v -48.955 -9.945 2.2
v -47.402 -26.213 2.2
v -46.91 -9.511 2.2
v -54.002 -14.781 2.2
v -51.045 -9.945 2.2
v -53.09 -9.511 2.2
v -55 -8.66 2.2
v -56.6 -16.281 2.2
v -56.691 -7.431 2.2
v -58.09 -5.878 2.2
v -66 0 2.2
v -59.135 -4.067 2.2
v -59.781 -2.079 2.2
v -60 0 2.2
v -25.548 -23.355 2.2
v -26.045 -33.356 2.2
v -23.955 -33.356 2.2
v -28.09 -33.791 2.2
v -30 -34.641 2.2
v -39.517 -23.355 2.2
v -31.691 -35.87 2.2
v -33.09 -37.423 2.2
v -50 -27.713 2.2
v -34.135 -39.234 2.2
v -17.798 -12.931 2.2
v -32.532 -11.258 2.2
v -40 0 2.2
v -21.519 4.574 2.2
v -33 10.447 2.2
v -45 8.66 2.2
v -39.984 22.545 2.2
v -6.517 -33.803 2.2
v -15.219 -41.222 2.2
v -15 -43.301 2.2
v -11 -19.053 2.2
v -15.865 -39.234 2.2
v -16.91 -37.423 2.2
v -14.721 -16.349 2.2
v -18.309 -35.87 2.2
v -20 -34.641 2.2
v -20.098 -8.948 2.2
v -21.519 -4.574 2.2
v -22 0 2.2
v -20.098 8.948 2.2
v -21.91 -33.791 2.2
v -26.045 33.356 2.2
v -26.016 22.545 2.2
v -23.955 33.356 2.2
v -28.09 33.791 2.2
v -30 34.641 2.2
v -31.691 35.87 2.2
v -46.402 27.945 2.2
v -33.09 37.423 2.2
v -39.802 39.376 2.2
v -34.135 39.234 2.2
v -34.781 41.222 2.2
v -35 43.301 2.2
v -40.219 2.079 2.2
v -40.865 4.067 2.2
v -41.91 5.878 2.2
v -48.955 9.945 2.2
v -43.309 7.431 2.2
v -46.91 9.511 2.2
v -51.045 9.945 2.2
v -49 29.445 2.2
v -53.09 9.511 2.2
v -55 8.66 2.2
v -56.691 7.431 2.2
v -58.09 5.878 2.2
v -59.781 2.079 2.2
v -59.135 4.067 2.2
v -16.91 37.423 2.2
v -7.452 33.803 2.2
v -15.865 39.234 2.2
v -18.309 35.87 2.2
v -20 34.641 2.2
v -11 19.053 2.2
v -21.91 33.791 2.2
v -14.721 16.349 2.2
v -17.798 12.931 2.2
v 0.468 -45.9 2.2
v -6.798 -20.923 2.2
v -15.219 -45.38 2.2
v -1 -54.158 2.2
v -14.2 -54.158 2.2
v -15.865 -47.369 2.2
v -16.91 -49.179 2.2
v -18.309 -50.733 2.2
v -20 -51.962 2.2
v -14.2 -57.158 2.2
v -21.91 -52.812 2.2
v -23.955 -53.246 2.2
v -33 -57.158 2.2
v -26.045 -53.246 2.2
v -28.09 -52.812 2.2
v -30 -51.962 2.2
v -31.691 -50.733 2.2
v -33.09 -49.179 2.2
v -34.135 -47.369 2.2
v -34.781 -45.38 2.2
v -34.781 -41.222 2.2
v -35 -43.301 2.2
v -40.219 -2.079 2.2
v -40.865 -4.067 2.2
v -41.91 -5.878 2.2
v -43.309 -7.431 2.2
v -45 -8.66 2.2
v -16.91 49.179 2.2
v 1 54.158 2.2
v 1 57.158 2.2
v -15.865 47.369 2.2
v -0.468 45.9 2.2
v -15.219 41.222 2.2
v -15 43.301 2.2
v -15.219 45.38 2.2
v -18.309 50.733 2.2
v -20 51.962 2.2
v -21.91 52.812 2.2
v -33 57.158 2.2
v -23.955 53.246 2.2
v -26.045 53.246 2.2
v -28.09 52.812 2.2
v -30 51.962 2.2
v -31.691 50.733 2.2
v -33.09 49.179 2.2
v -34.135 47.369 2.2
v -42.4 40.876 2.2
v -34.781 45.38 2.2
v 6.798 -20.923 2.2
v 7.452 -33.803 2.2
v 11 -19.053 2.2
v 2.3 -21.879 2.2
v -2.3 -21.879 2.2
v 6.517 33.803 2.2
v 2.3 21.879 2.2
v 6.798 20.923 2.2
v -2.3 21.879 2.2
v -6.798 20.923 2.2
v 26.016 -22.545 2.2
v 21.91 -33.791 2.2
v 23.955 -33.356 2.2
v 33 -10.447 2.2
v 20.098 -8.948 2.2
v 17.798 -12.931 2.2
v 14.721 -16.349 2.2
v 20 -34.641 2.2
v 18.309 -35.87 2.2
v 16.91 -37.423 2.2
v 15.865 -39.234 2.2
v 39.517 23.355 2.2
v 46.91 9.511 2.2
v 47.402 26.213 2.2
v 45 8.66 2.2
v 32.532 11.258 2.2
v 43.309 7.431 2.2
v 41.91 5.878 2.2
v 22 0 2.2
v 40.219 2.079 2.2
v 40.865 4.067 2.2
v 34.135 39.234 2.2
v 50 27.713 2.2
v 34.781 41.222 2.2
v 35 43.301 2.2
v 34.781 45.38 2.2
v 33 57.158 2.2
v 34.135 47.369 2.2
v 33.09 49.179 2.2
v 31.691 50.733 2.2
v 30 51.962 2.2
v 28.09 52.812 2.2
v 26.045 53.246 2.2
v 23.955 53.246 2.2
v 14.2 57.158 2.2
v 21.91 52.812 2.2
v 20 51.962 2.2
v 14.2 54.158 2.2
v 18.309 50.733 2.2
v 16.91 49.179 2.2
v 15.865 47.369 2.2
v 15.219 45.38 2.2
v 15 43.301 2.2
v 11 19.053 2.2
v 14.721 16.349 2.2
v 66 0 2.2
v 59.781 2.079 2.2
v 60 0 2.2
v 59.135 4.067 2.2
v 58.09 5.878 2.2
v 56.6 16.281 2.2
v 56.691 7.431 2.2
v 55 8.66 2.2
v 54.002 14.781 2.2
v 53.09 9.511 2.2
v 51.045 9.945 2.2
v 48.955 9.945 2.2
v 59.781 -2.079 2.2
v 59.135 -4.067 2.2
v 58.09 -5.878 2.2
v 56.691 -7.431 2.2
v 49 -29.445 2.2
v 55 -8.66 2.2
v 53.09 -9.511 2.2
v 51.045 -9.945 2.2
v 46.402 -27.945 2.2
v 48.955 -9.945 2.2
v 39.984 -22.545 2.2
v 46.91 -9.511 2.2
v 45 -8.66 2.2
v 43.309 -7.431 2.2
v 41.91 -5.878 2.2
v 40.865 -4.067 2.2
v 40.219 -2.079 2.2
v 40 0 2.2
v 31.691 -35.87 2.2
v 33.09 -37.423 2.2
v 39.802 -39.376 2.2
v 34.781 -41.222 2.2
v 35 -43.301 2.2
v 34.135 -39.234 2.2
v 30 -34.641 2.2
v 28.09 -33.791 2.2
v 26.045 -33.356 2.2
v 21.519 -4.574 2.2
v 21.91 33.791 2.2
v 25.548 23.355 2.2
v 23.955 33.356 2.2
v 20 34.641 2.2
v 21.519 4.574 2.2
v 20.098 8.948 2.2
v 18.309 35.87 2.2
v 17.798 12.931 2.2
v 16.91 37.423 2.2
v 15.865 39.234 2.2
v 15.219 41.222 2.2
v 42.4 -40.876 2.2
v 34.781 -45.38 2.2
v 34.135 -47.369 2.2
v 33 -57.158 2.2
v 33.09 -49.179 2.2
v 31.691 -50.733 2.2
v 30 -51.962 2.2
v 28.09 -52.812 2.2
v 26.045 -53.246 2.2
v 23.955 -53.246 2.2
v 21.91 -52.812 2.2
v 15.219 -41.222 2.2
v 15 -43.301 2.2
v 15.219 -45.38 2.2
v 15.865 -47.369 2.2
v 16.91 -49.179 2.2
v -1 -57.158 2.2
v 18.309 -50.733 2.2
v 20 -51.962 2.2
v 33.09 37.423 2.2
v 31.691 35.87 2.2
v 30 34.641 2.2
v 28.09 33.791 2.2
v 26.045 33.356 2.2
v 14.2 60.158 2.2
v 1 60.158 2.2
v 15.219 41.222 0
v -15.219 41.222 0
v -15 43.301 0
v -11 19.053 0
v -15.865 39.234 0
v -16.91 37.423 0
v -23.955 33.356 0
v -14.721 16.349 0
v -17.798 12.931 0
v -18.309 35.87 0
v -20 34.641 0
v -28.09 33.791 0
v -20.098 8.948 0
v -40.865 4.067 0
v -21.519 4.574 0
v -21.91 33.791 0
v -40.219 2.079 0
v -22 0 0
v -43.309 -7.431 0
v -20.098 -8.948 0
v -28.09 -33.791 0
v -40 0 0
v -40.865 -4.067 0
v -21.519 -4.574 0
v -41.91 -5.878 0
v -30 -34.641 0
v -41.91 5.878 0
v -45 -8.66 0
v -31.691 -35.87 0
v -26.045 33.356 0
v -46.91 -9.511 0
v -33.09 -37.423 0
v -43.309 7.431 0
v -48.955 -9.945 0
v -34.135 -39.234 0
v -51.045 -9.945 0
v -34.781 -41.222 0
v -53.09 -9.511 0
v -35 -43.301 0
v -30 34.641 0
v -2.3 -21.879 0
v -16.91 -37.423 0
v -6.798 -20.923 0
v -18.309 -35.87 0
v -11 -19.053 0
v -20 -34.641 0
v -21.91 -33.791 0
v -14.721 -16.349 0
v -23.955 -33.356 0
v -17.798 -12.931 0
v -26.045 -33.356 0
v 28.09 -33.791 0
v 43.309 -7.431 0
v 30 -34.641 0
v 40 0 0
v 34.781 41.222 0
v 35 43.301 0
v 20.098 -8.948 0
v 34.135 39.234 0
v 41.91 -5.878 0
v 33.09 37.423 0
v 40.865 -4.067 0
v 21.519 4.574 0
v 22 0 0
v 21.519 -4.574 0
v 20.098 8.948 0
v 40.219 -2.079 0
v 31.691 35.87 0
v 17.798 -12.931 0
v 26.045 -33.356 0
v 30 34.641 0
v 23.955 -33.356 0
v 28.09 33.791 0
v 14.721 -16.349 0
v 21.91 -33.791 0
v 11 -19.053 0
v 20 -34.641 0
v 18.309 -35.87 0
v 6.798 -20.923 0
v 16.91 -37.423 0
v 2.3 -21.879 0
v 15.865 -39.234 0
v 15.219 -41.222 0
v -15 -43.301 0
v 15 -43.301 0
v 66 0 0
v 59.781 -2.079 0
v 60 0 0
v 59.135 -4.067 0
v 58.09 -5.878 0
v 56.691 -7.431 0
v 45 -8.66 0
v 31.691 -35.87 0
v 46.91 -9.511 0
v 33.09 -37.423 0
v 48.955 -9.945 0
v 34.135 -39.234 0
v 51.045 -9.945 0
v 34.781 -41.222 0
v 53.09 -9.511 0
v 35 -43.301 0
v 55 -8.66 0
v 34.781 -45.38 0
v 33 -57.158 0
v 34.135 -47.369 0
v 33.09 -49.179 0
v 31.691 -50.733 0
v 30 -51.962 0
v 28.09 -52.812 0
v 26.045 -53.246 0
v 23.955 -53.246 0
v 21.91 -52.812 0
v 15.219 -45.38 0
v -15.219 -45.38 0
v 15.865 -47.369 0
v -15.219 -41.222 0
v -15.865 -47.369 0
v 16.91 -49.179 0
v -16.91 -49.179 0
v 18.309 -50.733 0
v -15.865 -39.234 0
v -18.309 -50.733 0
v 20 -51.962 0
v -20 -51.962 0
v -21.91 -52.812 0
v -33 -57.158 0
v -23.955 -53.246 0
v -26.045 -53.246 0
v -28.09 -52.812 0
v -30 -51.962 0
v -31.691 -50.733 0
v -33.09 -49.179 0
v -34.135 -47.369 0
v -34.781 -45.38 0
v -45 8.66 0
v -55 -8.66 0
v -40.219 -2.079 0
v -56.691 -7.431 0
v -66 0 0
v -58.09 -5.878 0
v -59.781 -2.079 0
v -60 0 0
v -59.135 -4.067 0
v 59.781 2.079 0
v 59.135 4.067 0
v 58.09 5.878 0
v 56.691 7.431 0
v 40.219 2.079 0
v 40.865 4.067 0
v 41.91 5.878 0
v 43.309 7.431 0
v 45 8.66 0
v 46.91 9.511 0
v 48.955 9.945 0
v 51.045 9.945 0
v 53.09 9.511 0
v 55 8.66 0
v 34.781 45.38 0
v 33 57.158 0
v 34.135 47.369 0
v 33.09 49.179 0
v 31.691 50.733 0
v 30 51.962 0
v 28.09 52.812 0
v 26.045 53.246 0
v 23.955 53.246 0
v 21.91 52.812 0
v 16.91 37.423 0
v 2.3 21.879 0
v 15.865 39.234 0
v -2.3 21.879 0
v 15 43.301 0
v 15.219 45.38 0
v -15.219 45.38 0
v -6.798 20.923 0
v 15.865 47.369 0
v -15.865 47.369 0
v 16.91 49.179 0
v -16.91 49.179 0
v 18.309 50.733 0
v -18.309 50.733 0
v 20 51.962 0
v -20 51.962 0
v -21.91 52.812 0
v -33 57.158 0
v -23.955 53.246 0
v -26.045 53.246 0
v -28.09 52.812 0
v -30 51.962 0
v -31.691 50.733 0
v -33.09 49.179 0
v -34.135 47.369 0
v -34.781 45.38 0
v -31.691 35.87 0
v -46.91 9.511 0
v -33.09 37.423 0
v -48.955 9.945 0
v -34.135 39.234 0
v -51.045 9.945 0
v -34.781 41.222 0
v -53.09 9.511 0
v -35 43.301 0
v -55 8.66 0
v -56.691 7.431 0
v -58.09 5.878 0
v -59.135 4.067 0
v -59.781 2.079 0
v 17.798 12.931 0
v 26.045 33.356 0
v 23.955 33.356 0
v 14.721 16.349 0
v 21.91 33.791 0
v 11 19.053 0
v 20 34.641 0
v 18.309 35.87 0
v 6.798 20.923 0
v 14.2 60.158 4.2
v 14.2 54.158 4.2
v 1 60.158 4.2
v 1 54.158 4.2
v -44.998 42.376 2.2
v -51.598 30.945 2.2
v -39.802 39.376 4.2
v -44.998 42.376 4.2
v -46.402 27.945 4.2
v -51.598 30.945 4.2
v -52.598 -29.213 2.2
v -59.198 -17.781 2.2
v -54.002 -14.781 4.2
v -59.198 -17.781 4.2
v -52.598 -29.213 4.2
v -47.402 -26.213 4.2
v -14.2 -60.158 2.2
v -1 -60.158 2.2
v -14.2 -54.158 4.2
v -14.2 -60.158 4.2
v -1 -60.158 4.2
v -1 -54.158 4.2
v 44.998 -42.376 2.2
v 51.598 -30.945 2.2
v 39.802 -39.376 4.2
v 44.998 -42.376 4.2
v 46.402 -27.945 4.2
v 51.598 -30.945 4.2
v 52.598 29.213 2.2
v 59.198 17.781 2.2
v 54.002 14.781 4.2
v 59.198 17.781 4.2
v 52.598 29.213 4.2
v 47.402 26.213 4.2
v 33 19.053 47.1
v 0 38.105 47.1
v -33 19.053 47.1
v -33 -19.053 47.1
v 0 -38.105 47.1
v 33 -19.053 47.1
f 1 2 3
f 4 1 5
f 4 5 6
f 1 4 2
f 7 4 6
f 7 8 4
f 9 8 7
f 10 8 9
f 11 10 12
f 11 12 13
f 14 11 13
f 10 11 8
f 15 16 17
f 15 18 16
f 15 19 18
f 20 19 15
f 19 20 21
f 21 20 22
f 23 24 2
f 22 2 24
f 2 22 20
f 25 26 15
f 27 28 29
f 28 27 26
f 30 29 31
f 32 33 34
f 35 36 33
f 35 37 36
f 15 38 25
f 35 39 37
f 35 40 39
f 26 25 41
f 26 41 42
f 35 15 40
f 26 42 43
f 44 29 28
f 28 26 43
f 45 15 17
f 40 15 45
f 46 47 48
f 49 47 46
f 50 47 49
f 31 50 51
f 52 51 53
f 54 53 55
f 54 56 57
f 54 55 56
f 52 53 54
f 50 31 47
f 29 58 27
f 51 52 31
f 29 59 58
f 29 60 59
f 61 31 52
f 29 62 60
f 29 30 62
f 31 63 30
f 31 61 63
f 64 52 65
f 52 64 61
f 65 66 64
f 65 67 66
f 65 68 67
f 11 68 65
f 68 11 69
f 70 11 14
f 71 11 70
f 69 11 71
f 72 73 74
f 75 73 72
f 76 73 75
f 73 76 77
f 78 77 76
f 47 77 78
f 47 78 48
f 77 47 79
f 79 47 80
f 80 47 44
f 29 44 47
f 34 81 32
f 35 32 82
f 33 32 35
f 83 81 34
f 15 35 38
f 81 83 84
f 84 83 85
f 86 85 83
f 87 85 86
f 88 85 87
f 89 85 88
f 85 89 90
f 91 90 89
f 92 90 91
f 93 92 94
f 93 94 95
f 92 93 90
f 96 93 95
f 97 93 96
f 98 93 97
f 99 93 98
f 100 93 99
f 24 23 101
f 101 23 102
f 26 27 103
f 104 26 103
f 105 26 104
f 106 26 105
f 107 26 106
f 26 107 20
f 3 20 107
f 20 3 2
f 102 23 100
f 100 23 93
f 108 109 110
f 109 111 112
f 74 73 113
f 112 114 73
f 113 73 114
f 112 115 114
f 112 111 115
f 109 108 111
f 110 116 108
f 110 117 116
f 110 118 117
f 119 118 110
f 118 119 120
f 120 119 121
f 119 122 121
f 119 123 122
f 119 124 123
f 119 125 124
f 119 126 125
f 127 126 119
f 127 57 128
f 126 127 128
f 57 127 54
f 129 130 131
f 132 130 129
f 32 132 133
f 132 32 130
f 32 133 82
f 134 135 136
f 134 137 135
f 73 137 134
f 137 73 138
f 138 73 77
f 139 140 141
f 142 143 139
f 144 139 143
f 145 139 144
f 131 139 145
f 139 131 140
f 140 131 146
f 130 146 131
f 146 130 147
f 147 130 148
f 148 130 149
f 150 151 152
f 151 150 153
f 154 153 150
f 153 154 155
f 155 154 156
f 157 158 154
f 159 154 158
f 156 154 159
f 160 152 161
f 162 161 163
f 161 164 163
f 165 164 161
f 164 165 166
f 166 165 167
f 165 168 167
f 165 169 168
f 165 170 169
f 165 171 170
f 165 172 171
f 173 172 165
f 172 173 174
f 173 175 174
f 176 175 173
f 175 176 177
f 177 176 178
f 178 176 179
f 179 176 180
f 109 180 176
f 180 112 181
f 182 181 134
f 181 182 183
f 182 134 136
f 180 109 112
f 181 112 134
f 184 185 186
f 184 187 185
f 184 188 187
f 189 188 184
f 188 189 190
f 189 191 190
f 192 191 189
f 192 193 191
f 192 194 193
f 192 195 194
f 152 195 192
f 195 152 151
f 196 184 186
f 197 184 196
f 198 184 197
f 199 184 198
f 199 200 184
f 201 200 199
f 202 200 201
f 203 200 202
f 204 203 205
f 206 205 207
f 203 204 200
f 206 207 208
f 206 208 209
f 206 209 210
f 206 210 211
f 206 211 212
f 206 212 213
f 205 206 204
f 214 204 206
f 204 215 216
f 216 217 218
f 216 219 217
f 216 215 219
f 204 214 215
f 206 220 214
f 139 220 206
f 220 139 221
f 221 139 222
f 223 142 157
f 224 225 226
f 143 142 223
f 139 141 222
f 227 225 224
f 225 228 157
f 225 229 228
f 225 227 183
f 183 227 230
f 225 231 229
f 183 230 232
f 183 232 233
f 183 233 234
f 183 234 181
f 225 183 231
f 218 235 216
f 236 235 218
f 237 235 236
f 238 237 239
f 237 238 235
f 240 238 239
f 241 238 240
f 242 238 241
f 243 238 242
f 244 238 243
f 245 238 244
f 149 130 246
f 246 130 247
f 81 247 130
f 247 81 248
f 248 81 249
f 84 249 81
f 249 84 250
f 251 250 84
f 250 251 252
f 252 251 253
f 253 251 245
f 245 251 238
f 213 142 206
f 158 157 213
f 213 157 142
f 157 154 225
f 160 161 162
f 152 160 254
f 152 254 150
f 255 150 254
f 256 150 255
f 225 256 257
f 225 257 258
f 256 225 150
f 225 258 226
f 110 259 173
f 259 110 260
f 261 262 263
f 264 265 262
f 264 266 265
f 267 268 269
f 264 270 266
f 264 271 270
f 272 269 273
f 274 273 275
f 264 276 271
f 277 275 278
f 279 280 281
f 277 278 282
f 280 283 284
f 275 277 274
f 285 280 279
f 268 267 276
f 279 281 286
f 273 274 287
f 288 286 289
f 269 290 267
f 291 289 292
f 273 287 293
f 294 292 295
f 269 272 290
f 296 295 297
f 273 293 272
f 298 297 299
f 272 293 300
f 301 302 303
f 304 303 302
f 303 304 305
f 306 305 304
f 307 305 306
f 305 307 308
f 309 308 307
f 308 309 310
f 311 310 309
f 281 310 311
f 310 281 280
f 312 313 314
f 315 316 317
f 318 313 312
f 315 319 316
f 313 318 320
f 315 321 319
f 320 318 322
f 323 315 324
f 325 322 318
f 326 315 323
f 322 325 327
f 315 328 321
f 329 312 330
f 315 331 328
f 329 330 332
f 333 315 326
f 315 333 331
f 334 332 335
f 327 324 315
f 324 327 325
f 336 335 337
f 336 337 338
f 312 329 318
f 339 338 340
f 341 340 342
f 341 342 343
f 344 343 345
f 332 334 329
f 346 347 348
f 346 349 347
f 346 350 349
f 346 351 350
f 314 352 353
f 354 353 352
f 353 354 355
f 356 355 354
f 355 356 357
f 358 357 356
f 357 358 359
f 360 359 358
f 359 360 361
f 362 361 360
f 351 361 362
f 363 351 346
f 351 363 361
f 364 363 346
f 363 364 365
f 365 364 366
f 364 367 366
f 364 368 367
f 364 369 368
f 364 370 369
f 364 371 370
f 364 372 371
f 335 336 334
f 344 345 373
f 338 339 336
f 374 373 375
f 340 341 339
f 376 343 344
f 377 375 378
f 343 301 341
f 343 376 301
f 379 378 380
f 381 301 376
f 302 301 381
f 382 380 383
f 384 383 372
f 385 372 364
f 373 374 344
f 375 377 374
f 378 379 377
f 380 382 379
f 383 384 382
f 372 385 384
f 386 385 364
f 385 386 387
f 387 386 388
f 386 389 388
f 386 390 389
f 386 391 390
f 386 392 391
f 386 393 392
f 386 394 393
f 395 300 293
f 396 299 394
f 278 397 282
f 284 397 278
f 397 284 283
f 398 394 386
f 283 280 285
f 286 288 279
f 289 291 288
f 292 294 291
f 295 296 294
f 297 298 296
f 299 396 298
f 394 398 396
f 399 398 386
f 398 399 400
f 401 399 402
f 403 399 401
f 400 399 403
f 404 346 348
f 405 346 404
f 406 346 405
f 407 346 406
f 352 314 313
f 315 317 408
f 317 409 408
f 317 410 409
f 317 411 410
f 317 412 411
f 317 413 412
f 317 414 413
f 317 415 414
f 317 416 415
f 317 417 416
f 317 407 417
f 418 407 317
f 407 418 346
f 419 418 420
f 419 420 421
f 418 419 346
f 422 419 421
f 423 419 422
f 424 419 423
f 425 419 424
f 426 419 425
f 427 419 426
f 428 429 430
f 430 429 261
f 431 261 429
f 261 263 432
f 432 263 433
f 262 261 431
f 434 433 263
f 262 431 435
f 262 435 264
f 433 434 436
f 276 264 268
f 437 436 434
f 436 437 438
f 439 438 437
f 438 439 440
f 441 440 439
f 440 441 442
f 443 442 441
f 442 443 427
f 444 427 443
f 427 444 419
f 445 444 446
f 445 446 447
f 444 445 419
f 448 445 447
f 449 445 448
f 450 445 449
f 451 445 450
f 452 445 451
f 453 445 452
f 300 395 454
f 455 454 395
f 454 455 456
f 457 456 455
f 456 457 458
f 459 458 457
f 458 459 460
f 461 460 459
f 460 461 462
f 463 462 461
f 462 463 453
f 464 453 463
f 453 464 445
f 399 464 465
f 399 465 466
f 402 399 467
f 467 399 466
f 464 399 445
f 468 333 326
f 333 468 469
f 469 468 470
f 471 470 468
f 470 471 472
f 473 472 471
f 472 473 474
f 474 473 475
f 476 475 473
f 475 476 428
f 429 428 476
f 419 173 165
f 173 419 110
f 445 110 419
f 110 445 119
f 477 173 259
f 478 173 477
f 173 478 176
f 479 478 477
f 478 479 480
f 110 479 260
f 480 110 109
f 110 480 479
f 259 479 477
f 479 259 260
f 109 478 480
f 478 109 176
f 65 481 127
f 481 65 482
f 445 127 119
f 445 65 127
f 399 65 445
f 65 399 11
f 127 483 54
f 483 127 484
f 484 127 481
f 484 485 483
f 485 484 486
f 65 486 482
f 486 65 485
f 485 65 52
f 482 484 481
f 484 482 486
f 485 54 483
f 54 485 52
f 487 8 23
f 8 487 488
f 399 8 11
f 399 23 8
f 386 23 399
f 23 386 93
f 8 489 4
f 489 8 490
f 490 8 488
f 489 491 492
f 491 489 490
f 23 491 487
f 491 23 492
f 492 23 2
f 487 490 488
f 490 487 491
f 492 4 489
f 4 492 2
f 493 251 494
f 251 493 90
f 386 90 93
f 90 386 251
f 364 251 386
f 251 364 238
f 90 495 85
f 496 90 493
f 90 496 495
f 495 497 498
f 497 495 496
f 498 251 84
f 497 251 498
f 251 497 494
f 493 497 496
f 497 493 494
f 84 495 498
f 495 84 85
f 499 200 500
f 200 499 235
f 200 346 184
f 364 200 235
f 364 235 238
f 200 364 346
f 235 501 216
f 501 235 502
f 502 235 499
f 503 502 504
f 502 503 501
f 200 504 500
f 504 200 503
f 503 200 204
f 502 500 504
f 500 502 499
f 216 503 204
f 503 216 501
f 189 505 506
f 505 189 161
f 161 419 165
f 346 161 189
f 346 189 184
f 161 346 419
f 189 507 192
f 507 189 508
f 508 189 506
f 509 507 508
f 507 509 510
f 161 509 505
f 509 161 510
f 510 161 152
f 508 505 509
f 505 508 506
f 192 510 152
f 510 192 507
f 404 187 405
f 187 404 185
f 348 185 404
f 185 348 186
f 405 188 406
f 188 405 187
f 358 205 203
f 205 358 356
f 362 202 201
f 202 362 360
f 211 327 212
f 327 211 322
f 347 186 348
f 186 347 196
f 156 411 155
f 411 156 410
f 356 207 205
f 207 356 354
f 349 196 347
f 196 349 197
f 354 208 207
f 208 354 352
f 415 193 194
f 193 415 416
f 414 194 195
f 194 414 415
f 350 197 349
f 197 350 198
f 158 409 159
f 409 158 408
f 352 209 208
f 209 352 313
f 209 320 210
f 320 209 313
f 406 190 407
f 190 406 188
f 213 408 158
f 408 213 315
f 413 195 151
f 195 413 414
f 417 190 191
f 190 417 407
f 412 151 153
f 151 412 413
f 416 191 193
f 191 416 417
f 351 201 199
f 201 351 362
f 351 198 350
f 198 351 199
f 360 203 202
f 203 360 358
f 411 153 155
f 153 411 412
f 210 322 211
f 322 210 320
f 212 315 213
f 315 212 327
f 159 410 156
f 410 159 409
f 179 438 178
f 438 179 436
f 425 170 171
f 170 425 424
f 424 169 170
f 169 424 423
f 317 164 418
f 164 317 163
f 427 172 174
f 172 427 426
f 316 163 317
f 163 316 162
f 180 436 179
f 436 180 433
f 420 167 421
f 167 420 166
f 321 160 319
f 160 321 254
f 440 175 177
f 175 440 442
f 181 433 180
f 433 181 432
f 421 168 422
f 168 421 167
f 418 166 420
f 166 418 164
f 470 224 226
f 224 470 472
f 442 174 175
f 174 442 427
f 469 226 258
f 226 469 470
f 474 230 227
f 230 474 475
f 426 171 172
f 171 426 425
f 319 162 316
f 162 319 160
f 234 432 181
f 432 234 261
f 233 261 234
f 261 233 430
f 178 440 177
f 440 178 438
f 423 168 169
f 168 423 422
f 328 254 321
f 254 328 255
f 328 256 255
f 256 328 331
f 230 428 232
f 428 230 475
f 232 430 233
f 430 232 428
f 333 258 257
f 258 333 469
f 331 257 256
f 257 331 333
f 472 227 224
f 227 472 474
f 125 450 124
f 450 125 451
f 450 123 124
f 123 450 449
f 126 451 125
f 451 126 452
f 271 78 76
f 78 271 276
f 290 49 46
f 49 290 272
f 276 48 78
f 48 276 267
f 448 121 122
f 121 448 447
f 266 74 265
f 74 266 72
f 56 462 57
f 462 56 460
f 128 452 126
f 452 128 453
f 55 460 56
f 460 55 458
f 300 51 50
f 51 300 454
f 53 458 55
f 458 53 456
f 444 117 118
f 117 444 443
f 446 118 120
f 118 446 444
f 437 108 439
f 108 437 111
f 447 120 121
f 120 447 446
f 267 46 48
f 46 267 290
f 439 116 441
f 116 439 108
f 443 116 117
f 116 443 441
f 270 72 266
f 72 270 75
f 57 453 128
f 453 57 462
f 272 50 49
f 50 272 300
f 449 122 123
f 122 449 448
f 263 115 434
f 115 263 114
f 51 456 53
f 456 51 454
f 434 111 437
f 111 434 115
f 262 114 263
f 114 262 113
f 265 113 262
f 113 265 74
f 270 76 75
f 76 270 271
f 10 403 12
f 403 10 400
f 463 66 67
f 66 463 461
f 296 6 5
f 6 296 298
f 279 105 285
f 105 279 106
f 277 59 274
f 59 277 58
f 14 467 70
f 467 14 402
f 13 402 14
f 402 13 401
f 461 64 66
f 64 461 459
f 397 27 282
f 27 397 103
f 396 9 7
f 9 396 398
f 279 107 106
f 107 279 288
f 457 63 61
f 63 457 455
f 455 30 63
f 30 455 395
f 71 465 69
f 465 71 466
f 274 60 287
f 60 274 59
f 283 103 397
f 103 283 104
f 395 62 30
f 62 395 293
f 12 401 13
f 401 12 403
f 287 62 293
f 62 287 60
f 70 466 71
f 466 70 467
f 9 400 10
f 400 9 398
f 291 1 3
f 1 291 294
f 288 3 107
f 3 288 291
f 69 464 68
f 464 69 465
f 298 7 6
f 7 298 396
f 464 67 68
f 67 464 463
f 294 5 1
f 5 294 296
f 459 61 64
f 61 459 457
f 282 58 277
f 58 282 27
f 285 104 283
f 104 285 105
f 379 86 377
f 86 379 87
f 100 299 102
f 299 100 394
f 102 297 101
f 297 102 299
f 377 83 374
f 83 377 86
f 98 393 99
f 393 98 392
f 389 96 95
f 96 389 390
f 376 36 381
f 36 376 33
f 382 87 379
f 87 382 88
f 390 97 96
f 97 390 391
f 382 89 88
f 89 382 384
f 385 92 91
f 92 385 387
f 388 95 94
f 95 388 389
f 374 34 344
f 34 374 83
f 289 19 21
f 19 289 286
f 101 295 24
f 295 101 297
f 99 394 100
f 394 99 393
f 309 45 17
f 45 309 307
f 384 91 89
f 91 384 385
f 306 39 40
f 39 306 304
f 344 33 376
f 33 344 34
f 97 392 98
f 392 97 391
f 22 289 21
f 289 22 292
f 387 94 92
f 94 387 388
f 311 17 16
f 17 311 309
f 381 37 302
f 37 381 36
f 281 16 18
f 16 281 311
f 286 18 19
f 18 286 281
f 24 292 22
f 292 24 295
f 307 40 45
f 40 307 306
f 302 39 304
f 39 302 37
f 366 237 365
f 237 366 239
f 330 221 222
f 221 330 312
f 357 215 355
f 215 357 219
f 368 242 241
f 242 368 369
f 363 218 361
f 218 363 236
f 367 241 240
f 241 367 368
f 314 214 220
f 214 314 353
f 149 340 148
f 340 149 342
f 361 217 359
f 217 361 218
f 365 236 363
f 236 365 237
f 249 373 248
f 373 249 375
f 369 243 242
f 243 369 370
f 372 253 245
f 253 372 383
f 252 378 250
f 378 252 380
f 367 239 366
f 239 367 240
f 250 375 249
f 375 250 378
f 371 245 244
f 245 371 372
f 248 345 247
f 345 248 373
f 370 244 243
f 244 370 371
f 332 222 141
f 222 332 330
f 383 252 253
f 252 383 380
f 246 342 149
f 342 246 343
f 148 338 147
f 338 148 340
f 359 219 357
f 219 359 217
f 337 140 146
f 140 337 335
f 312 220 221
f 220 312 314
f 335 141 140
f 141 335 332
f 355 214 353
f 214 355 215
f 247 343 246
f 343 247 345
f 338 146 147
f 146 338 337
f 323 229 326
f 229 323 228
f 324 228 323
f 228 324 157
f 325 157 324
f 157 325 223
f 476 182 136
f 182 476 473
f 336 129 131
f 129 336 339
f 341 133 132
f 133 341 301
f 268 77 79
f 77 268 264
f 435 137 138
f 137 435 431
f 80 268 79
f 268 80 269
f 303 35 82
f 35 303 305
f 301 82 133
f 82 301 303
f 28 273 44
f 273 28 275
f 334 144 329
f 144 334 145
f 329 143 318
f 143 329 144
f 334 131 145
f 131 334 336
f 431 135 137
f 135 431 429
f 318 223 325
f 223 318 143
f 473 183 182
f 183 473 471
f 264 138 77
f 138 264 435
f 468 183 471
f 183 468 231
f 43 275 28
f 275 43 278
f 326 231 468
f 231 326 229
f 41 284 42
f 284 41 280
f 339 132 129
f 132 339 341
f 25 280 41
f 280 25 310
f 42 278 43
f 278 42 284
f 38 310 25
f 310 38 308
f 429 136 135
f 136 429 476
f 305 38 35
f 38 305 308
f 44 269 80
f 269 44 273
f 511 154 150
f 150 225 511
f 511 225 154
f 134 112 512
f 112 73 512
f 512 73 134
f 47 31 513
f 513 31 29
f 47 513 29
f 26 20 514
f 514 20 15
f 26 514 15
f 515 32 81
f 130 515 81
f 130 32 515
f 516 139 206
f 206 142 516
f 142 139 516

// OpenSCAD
//
// The dragon teeth is an anti-cat fortification, similar to the one
// used against tanks, only smaller. It is also similar in function
// to fortifications against pigeons and homeless. Ultimately, it denies
// cats the comfort they crave when they defecate in our chimnea.
//

base_th = 2.2;

module tooth () {
    // sin(pi/3) = 0.8660254;
    bot_w = 14.0;
    translate([0, (bot_w/4)*-1, 0]) {
        polyhedron(
            // point indexes are used for faces
            //        #0       #1           #2           #3
            points=[ [(bot_w/2)*-1, 0, 0],
                     [bot_w/2,      0, 0],
                     [0, bot_w*sin(60), 0],
                     [0.0, bot_w/4, 45.0] ],
            faces=[ [0,3,1], [2,3,0], [1,3,2],   [0,1,2] ]
        );
    }
}

module base () {

    base_sl = 66.0;
    for (angle = [0 : 60 : 300]) {
        rotate(angle, [0,0,1]) {
            // A cube that forms the base.
            translate([(base_sl/2)*-1, 0, 0])
                cube([base_sl, base_sl*sin(60), base_th]);
            // A clip.
            translate([1.0, base_sl*sin(60) - 3.0, base_th])
                cube([base_sl*0.2, 6.0, 2.0]);
        }
    }
}

// Teeth are designed to sit on a hexagon created by base().
// So this is not really an independent module. Too bad.
module teeth () {

    base_sl = 66.0;
    for (angle = [0 : 60 : 300]) {
        rotate(angle + 30, [0,0,1]) {
            translate([(base_sl)/(2*sin(60)), 0, base_th - 0.1])
                // for (angle3 = [0 : 120 : 300]) {
                //     rotate(angle3 + 60, [0,0,1]) {
                //         translate([base_sl/(5*sin(60)), 0, 0])
                //             tooth();
                //     }
                // }
                rotate(30, [0,0,1])
                    tooth();
        }
    }
}

module holes () {
    translate([0, 0, -0.1])
        cylinder(base_th + 0.2, r=22.0);
    for (angle = [0 : 60 : 300]) {
        rotate(angle + 0, [0,0,1]) {
            translate([50.0, 0, -0.1])
                cylinder(base_th + 0.2, r=10.0);
        }
    }
}

module main () {
    difference () {
        base();
        holes();
    }
    teeth();
}

main();
